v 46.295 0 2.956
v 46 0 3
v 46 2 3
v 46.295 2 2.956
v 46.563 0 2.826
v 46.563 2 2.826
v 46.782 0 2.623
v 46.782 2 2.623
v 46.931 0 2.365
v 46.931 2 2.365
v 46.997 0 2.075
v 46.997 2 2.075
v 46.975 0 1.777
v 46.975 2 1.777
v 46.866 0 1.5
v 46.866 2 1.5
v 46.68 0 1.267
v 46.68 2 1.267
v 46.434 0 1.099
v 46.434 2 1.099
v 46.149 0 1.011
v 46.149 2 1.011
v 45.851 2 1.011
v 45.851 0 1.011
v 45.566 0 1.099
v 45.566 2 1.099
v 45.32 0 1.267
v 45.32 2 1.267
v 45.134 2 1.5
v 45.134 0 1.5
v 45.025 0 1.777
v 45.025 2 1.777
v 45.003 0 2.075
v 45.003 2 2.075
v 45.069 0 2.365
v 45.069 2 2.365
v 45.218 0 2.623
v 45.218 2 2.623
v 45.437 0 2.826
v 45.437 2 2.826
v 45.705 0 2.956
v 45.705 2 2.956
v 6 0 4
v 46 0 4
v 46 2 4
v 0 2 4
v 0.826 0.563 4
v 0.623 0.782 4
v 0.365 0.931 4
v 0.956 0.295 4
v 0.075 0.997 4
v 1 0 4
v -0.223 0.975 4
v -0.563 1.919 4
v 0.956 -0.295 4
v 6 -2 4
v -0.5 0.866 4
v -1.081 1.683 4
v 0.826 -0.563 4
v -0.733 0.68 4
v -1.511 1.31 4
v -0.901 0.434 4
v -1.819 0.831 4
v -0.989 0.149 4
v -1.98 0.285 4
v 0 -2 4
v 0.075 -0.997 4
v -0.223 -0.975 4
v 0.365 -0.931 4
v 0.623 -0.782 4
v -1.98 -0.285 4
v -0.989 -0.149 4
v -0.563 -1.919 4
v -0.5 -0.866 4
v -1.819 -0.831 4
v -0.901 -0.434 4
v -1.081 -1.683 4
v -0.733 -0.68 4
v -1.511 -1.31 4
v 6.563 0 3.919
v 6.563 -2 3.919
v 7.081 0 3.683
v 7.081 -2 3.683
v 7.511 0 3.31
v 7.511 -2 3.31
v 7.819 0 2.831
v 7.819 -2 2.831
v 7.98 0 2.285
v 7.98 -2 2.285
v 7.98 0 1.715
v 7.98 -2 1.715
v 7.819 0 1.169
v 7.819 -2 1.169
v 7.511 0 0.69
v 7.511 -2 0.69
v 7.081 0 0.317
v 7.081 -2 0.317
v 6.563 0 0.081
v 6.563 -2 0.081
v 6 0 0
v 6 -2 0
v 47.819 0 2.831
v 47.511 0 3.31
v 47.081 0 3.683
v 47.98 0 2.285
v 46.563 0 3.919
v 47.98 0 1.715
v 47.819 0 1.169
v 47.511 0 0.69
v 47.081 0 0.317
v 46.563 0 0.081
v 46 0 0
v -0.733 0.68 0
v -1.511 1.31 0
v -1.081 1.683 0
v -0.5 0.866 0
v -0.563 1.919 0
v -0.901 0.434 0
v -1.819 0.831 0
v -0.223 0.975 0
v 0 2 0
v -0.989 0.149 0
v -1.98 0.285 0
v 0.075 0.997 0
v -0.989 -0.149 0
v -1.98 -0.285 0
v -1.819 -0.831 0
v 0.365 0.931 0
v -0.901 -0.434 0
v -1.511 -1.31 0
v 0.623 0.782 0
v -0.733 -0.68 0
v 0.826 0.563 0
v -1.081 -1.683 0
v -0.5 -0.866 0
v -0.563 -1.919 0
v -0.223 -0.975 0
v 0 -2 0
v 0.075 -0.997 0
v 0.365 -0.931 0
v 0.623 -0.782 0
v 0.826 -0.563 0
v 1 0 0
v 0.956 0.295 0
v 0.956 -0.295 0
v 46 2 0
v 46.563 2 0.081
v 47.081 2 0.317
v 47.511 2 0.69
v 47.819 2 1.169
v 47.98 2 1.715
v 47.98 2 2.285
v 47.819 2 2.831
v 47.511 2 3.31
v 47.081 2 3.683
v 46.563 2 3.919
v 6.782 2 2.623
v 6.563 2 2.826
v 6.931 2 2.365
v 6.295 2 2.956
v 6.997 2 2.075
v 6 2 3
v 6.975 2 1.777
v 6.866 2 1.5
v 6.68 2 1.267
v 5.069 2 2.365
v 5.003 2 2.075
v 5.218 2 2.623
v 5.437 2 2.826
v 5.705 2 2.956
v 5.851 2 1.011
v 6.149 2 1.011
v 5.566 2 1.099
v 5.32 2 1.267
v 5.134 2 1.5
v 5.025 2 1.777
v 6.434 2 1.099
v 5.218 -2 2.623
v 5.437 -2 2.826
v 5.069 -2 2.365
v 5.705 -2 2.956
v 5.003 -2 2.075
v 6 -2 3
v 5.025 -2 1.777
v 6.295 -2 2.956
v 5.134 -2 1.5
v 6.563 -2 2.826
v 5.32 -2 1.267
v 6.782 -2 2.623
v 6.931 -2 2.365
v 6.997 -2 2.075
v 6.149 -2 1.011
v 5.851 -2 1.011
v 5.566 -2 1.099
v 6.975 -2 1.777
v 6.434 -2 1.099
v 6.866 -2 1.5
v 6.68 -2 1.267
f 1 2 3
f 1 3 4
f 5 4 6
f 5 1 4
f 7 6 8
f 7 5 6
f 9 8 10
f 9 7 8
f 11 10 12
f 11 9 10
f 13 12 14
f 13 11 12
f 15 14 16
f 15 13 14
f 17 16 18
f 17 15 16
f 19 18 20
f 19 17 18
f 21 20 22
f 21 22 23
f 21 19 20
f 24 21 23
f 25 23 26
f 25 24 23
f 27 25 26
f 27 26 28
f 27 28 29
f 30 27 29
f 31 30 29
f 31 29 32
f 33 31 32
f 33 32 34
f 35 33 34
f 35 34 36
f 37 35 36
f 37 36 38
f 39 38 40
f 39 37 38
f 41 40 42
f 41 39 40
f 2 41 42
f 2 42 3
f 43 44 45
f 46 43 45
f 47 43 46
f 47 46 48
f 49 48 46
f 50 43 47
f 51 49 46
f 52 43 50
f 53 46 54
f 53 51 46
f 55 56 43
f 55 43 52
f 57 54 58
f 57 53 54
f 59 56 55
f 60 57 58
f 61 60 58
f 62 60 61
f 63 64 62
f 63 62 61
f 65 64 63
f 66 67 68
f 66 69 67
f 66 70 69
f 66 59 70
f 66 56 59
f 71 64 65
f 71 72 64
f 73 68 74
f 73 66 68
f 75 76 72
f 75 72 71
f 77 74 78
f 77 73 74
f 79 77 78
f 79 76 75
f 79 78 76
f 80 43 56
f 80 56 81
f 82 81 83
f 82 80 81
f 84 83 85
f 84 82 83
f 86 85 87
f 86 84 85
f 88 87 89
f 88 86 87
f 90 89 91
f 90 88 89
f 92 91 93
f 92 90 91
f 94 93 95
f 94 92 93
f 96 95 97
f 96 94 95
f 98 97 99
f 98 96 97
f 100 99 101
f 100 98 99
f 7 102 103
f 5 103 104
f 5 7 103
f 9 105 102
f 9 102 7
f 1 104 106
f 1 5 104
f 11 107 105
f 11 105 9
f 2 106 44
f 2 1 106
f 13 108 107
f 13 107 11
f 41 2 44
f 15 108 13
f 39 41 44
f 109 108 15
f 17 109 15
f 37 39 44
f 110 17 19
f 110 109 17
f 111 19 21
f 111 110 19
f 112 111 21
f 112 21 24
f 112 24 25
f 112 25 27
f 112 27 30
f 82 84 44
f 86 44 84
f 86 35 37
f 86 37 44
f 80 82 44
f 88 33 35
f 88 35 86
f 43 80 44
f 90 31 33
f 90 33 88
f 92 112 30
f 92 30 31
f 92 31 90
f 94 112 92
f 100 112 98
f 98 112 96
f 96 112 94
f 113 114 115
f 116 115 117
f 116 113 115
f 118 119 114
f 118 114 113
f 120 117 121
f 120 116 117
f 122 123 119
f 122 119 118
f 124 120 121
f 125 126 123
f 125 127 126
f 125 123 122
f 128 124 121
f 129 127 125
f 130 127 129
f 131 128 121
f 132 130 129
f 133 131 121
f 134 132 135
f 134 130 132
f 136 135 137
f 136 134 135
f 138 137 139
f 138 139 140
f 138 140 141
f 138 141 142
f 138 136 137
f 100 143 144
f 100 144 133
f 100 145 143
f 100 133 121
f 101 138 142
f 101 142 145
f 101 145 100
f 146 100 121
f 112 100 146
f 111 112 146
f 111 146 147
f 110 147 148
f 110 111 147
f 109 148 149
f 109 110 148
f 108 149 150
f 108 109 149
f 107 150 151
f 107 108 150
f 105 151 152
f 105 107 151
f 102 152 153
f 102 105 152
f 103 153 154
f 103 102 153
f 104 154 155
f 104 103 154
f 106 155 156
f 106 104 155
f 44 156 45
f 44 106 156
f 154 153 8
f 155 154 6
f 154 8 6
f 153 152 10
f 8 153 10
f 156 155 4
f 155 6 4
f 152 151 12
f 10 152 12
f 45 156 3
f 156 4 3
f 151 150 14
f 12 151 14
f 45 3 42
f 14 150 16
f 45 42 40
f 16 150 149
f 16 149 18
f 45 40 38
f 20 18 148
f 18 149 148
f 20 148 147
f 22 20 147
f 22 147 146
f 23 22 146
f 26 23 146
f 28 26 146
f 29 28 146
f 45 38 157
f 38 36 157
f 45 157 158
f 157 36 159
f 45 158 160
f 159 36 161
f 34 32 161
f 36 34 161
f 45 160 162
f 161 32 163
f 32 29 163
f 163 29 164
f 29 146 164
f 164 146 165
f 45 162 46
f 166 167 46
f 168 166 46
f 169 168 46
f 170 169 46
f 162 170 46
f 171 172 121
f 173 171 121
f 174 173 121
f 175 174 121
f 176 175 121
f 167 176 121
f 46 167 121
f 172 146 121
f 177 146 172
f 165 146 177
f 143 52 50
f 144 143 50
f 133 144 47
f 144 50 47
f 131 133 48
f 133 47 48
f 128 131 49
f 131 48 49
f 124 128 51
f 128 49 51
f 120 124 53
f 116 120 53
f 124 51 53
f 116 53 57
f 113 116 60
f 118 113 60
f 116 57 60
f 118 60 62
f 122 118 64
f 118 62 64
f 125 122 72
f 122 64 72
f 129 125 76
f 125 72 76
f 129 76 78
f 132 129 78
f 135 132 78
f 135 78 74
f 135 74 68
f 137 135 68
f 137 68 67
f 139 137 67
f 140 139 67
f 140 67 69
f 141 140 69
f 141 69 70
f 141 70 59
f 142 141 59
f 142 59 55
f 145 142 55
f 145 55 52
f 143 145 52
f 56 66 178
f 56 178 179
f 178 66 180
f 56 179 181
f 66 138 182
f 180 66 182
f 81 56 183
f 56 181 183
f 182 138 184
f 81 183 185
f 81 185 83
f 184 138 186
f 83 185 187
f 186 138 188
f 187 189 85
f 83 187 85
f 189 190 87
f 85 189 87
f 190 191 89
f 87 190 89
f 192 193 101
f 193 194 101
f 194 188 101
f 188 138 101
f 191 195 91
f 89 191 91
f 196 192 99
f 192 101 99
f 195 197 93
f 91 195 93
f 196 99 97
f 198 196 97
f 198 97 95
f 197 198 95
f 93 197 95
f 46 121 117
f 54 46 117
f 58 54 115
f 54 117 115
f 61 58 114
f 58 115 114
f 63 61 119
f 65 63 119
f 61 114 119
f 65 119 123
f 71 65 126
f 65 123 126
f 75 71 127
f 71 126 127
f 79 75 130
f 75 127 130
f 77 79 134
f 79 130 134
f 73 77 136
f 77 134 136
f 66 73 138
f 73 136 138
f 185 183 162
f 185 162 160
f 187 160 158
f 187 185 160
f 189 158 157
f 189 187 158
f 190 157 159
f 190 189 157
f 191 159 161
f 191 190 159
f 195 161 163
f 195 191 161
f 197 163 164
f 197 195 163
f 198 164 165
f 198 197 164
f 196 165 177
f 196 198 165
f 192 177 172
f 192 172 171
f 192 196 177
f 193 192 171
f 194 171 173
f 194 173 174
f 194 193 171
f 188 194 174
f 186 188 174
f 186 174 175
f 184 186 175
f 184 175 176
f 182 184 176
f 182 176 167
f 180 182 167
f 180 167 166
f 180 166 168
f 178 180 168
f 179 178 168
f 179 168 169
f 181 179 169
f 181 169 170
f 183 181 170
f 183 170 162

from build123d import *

# Parameters (mm, degrees)
SKETCH1_R           = 2
BOSS_EXTRUDE1_DEPTH = 4
BOSS_EXTRUDE2_START = -4
BOSS_EXTRUDE2_DEPTH = 4
SKETCH3_R           = 1
CUT_EXTRUDE1_DEPTH  = 6.385164807
SKETCH7_R           = 1
BOSS_EXTRUDE4_DEPTH = 2
SKETCH8_R           = 1
BOSS_EXTRUDE5_DEPTH = 2


with BuildPart() as part:
    # Sketch1 → Boss-Extrude1 (new body)
    with BuildSketch(Plane.XY):
        Circle(SKETCH1_R)
    extrude(amount=BOSS_EXTRUDE1_DEPTH)

    # Sketch2 → Boss-Extrude2 (add)
    with BuildSketch(Plane.XY.offset(4).offset(BOSS_EXTRUDE2_START)):
        with BuildLine():
            Line((3, 2), (0, 2))
            ThreePointArc((0, 2), (1.414213562, 1.414213562), (2, 0))
            ThreePointArc((2, 0), (1.414213562, -1.414213562), (0, -2))
            Line((0, -2), (3, -2))
            Line((3, -2), (3, 2))
        make_face()
    extrude(amount=BOSS_EXTRUDE2_DEPTH)

    # Sketch3 → Cut-Extrude1 (cut, through all)
    with BuildSketch(Plane.XY.offset(4)):
        Circle(SKETCH3_R)
    extrude(amount=-CUT_EXTRUDE1_DEPTH, mode=Mode.SUBTRACT)

    # Sketch7 → Boss-Extrude4 (add, symmetric)
    with BuildSketch(Plane(origin=(0, 0, 0), x_dir=(1, 0, 0), z_dir=(0, 1, 0))):
        with BuildLine():
            Line((3, 0), (3, -4))
            Line((3, -4), (6, -4))
            ThreePointArc((6, -4), (8, -2), (6, 0))
            Line((6, 0), (3, 0))
        make_face()
        with Locations(Location((6, -2, 0), (0, 0, 270))):
            Circle(SKETCH7_R, mode=Mode.SUBTRACT)
    extrude(amount=BOSS_EXTRUDE4_DEPTH, both=True)

    # Sketch8 → Boss-Extrude5 (add)
    with BuildSketch(Plane(origin=(0, 0, 0), x_dir=(1, 0, 0), z_dir=(0, 1, 0))):
        with BuildLine():
            Line((46, -4), (6, -4))
            ThreePointArc((6, -4), (4, -2), (6, 0))
            Line((6, 0), (46, 0))
            ThreePointArc((46, 0), (48, -2), (46, -4))
        make_face()
        with Locations(Location((46, -2, 0), (0, 0, 270))):
            Circle(SKETCH8_R, mode=Mode.SUBTRACT)
        with Locations(Location((6, -2, 0), (0, 0, 270))):
            Circle(SKETCH8_R, mode=Mode.SUBTRACT)
    extrude(amount=BOSS_EXTRUDE5_DEPTH)


solid = part.part
